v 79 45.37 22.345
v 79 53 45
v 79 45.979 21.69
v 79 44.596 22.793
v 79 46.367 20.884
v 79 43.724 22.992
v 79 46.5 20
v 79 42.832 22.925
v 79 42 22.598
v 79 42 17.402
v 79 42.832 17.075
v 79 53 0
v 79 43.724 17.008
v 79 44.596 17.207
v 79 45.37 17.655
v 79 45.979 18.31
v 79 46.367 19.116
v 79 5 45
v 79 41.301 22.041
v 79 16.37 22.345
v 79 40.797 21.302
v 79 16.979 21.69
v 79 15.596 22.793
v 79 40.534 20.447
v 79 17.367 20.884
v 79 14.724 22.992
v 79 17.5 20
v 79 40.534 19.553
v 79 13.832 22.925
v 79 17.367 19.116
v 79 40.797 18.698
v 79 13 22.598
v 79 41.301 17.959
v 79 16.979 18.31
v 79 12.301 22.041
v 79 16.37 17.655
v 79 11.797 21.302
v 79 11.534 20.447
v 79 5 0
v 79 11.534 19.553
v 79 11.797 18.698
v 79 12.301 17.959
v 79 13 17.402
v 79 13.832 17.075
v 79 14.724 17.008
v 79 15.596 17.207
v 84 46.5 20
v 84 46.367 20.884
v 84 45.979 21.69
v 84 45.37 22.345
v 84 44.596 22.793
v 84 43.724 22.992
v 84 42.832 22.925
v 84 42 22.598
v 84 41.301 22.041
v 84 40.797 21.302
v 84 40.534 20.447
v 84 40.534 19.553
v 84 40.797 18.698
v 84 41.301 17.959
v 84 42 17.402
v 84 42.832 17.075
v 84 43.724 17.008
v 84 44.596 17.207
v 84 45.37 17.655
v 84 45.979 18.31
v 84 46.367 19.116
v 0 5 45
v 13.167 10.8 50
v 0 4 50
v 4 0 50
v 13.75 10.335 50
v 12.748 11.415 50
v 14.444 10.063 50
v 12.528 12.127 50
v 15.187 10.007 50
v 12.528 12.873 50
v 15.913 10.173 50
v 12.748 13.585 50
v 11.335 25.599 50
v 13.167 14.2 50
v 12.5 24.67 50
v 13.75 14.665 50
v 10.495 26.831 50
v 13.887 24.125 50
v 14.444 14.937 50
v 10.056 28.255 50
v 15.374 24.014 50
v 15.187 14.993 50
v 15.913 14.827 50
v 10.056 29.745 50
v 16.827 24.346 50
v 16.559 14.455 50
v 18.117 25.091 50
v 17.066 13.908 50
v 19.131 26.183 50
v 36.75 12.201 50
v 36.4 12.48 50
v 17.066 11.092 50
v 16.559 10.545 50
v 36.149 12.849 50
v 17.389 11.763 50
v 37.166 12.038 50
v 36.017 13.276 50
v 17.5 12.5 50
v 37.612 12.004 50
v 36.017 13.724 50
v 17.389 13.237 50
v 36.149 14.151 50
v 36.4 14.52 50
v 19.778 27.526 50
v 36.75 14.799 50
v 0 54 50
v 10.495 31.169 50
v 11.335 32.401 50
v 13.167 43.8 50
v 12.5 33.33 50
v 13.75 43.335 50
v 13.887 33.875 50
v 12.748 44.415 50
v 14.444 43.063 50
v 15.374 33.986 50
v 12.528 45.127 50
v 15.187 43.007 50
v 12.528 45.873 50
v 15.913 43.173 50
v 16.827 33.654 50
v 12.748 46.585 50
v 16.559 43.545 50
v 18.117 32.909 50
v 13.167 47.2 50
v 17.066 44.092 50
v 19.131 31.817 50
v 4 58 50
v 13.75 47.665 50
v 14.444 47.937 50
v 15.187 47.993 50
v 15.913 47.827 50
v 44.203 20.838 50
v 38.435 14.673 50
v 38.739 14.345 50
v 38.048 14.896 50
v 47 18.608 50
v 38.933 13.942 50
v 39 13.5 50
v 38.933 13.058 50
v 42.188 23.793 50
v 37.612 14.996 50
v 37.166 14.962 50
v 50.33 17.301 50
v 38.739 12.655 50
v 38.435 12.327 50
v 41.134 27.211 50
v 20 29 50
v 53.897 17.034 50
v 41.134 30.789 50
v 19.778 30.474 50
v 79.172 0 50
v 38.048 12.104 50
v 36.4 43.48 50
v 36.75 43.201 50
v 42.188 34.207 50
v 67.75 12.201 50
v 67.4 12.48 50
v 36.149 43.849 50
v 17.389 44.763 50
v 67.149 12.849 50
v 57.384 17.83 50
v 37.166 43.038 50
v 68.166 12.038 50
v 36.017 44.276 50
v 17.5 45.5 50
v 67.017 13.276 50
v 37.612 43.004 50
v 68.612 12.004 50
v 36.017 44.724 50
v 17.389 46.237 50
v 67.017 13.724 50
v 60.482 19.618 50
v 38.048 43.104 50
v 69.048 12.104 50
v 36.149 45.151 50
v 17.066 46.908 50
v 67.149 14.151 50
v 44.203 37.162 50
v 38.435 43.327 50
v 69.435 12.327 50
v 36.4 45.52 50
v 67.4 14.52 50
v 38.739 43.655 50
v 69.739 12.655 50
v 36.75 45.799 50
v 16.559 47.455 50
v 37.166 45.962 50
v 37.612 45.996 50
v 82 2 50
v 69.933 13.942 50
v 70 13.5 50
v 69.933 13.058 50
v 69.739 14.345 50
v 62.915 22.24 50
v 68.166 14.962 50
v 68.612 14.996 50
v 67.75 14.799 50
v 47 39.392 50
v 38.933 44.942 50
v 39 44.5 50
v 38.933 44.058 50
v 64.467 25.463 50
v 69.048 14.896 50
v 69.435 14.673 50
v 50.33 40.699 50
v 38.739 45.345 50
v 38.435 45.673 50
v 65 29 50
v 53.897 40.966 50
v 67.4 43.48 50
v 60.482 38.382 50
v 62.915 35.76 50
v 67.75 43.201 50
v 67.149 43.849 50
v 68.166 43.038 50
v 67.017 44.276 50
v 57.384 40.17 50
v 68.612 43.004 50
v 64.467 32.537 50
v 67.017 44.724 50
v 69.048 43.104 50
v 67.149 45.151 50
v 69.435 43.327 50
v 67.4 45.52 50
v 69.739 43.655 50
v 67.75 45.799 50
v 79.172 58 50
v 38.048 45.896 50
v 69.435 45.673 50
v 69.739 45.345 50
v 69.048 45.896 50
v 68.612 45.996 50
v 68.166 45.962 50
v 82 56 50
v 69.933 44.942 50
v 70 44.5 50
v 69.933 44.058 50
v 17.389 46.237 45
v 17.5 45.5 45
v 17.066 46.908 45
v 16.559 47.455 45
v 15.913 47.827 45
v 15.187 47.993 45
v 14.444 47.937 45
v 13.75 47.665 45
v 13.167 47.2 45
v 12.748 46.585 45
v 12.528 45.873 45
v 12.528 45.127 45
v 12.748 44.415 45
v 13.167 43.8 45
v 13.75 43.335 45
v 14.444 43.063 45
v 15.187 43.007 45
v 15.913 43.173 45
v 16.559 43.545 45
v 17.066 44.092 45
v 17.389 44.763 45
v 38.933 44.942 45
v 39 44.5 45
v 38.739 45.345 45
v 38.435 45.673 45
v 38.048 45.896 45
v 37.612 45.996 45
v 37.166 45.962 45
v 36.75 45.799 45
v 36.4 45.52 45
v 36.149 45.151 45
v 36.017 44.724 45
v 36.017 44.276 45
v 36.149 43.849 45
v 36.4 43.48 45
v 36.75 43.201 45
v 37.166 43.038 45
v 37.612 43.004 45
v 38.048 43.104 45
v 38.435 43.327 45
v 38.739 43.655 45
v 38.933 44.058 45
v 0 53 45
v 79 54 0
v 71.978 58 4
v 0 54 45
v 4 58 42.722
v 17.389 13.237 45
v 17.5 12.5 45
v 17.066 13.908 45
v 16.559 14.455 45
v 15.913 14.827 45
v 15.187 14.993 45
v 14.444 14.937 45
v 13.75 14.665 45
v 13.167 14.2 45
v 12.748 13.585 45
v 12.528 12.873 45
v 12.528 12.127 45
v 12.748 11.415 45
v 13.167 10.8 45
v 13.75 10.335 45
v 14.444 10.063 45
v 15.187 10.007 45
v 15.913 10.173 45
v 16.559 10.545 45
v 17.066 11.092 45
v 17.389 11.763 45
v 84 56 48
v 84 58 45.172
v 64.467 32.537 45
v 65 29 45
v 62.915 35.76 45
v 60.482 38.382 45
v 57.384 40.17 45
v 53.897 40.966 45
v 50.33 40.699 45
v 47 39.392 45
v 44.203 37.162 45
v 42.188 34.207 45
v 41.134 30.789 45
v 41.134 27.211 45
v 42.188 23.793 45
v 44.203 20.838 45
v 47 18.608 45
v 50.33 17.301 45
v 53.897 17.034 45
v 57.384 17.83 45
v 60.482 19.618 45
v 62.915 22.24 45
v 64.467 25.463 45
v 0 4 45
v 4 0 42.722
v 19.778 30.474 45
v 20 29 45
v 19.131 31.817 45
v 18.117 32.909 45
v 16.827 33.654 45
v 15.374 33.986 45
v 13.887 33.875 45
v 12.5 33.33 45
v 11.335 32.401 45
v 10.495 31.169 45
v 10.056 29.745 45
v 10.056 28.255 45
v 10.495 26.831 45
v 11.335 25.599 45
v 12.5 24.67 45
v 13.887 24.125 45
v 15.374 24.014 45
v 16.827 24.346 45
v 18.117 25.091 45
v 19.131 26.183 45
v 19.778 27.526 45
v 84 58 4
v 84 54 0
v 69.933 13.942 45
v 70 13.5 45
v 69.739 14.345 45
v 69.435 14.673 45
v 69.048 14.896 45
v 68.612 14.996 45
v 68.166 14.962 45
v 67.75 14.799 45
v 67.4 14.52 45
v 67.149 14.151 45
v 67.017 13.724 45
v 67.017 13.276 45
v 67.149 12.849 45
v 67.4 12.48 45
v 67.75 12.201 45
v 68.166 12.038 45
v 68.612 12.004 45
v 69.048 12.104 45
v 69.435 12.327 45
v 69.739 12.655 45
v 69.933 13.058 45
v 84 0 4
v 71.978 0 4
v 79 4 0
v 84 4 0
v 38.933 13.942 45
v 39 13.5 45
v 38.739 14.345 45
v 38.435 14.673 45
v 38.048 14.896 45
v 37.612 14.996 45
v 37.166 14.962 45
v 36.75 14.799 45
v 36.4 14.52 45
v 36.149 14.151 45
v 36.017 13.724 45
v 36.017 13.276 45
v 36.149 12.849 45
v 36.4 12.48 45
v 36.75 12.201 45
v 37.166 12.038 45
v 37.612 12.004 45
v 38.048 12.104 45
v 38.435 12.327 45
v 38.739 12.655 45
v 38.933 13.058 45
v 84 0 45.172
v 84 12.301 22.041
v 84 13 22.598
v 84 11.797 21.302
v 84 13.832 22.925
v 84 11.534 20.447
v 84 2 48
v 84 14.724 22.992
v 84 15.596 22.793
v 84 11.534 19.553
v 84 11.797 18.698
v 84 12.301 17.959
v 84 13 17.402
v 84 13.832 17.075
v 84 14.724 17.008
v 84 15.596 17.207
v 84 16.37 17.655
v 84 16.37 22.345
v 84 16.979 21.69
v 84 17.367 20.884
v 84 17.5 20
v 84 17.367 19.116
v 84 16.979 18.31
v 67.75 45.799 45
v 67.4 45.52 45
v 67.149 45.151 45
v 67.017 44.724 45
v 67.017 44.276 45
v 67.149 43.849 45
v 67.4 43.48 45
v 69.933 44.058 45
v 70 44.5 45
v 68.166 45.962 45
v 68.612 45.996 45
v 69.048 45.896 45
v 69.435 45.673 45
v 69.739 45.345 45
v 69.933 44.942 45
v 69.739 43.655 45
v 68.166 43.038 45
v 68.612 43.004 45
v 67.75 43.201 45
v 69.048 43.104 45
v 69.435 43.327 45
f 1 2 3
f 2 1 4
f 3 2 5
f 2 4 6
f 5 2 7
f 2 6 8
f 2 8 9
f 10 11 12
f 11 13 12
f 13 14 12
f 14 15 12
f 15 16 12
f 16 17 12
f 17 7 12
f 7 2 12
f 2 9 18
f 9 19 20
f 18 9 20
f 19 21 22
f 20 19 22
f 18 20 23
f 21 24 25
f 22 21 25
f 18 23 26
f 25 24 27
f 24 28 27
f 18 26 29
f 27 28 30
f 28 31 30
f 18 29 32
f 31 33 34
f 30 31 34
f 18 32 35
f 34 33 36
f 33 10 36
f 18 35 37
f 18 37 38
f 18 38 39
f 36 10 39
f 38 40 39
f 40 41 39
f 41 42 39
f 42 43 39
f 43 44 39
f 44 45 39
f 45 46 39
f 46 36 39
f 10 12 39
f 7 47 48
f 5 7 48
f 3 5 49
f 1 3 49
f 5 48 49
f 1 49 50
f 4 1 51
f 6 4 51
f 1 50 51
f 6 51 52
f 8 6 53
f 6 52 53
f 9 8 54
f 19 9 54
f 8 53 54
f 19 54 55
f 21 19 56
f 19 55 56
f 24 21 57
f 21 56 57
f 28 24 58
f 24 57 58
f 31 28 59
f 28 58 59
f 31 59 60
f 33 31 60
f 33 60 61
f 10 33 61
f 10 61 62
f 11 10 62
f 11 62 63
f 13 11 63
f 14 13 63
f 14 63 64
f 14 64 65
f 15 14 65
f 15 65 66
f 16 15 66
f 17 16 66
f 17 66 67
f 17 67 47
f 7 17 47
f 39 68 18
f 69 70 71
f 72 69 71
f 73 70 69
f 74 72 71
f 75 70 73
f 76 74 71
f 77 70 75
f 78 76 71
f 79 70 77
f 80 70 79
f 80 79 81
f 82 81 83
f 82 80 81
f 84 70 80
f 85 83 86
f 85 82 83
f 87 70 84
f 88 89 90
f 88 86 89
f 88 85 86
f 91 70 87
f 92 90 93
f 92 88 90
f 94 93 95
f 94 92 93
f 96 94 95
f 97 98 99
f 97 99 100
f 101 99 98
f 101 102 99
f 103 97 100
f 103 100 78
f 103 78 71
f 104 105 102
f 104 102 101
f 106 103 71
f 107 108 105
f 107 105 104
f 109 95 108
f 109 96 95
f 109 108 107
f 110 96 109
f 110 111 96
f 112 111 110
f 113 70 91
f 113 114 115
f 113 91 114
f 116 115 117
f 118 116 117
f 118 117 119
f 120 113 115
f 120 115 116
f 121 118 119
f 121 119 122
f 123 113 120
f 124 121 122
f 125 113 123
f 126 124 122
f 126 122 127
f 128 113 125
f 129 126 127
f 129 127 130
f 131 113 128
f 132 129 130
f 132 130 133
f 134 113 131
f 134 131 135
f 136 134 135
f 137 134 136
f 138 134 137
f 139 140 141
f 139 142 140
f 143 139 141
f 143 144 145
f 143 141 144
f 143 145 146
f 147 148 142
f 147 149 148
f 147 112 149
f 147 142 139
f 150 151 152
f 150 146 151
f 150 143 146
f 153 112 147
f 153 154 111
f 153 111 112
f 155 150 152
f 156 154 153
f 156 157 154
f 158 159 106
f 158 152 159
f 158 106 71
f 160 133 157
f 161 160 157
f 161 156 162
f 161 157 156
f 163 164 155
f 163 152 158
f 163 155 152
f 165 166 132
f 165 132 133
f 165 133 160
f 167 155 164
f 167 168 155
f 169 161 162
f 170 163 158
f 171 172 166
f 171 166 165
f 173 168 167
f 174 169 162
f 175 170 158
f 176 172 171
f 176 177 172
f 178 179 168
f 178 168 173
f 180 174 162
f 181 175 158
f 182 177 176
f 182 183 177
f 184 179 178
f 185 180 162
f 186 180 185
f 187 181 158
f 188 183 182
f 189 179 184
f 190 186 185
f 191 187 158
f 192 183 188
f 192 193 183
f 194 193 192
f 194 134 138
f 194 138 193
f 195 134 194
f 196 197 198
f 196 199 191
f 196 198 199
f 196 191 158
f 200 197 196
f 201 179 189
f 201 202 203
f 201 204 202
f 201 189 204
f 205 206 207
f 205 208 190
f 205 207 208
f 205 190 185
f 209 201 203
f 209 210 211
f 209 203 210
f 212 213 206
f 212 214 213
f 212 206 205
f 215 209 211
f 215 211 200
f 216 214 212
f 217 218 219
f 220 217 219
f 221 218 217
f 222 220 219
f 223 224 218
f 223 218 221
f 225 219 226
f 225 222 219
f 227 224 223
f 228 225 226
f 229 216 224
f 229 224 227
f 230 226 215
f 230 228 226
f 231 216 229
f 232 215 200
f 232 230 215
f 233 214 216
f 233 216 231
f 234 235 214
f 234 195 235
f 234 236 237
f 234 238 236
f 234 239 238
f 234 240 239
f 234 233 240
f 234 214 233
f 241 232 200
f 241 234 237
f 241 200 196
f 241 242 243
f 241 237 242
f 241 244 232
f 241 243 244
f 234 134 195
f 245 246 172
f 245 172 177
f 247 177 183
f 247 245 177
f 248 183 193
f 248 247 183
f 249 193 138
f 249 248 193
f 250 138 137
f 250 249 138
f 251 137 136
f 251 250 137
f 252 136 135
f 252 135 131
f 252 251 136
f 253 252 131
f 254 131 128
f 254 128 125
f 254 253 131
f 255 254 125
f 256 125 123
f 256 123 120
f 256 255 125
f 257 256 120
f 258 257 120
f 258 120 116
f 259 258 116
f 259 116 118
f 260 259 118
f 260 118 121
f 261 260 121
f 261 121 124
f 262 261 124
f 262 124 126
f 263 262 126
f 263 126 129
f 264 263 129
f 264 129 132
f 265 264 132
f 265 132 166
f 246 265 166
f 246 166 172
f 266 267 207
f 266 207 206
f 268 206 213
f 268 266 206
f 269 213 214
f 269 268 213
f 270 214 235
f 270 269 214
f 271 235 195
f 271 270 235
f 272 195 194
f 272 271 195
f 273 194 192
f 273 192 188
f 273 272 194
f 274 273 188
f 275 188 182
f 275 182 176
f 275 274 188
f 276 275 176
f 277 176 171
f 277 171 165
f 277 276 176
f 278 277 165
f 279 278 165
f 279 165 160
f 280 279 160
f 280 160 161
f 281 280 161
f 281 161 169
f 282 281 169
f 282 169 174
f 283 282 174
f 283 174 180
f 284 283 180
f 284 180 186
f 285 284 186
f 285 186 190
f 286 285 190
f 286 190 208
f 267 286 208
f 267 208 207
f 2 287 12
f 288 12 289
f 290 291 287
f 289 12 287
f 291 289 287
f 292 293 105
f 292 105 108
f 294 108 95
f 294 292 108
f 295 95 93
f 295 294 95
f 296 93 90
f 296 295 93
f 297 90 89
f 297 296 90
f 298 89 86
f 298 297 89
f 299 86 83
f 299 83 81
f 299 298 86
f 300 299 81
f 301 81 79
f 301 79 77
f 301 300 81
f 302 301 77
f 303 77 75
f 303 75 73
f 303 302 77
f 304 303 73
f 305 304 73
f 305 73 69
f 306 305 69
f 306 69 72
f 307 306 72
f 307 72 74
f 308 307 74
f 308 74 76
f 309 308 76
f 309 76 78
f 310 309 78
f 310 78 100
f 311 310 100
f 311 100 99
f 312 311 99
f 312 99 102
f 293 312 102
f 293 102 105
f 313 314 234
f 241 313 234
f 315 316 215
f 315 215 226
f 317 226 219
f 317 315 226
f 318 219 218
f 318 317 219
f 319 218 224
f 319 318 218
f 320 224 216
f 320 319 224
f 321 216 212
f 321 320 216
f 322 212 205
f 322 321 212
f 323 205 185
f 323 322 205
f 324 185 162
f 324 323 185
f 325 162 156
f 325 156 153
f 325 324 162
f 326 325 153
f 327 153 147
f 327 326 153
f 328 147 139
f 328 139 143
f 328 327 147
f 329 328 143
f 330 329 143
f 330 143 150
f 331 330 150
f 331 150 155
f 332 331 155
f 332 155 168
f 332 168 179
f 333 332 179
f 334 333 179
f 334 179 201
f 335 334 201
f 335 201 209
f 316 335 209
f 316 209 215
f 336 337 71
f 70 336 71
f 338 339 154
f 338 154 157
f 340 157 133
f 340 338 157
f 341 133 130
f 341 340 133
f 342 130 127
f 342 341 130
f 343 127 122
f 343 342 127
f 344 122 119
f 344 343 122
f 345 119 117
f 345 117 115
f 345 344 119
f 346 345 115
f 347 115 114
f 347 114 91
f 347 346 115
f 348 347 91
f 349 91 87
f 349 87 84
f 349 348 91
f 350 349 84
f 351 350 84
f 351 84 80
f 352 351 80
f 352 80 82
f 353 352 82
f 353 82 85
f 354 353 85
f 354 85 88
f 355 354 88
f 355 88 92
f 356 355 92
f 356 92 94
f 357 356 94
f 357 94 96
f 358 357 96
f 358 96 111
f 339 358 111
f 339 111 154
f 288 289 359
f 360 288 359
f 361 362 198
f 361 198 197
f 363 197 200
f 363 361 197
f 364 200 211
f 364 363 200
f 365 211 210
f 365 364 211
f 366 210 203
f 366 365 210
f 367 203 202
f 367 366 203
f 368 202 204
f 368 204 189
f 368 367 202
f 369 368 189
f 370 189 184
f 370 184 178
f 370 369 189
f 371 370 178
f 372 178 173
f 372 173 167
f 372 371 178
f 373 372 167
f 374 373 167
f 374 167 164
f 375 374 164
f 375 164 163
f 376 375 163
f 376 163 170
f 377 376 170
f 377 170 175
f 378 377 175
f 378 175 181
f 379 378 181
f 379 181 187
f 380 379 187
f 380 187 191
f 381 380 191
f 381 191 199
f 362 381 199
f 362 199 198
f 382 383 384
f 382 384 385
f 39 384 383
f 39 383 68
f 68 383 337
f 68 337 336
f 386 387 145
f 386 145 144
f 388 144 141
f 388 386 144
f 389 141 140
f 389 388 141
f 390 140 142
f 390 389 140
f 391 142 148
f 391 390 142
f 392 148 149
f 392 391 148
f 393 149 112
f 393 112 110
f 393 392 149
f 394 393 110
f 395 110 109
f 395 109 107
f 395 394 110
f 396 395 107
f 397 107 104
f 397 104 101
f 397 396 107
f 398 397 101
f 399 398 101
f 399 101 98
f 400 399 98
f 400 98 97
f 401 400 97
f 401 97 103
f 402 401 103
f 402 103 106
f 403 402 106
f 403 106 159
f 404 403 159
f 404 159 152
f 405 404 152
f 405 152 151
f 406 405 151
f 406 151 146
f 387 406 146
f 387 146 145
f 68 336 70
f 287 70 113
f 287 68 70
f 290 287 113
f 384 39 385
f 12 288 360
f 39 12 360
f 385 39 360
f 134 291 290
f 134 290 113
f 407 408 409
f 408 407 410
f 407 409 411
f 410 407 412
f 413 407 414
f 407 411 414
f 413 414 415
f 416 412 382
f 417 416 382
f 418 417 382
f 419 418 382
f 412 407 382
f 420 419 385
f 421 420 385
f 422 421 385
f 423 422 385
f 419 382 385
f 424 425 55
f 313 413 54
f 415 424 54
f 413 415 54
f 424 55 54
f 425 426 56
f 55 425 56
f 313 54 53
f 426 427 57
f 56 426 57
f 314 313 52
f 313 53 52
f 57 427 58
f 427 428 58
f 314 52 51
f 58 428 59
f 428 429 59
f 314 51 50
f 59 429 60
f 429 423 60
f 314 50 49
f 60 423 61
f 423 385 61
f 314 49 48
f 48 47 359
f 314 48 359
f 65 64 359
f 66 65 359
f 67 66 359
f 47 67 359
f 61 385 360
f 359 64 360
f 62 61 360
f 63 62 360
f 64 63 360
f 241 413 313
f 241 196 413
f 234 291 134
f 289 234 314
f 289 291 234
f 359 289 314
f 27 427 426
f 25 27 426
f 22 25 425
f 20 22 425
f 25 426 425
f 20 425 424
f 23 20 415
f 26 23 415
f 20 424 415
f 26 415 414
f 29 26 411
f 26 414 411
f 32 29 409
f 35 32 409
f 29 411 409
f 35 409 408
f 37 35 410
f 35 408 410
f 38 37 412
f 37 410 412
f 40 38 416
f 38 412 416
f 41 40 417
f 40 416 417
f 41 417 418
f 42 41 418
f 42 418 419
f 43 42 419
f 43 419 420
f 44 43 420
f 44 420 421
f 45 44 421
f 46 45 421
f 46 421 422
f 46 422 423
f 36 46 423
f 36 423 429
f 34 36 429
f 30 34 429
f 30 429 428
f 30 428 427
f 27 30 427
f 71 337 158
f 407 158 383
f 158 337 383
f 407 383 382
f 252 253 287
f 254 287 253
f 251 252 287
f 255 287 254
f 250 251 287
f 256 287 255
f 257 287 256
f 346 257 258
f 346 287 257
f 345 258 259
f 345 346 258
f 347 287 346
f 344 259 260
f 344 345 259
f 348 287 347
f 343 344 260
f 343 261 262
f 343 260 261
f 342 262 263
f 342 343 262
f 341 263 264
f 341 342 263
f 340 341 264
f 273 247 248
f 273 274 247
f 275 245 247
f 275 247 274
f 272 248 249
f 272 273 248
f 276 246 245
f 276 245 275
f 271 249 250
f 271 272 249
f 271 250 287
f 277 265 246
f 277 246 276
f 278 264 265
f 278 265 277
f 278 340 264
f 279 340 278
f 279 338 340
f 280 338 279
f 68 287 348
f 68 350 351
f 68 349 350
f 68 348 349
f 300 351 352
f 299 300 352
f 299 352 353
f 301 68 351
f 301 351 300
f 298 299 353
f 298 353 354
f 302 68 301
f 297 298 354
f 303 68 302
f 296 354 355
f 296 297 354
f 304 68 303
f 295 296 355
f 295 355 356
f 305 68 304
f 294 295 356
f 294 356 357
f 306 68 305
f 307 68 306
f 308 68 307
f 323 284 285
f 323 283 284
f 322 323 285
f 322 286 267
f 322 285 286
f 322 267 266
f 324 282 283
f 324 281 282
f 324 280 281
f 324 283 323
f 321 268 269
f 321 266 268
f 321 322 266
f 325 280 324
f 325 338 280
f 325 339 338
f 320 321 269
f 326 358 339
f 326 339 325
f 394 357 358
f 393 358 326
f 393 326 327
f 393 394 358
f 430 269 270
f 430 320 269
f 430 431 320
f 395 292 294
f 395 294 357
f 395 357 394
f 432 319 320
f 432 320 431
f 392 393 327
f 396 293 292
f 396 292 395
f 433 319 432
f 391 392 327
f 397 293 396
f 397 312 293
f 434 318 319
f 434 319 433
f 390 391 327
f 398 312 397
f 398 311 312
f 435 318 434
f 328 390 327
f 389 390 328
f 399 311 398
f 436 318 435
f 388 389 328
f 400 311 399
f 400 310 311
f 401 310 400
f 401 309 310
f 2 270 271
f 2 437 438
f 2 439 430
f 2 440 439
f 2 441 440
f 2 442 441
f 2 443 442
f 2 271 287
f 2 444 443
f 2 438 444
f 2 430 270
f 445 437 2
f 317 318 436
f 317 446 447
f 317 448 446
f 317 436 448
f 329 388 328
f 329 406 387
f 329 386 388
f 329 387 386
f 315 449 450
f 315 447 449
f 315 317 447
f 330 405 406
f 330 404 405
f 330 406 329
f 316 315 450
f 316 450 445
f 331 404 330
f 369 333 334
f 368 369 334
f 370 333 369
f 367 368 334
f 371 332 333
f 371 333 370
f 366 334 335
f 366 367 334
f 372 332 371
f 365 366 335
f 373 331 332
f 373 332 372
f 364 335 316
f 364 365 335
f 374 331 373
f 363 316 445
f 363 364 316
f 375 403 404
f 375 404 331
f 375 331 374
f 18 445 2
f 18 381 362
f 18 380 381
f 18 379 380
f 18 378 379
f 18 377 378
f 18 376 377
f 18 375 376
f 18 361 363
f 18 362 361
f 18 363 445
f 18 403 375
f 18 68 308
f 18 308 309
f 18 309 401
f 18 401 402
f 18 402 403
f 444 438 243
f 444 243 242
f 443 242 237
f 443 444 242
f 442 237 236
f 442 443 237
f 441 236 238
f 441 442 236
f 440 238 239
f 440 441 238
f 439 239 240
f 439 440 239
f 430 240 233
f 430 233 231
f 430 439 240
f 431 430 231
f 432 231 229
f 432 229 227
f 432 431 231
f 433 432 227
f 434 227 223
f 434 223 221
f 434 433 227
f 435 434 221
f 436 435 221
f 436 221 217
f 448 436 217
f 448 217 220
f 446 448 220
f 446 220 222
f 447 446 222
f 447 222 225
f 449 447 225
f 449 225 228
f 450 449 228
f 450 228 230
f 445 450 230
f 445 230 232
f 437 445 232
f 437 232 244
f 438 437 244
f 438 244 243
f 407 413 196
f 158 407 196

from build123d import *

# Parameters (mm, degrees)
SKETCH_W        = 84
SKETCH_H        = 58
SKETCH_R        = 1.5
SKETCH_R_2      = 12
SKETCH_R_3      = 2.5
SKETCH_R_4      = 5
PAD_DEPTH       = 50
SKETCH001_W     = 79
SKETCH001_H     = 48
POCKET_DEPTH    = 45
POCKET001_DEPTH = 58.001
SKETCH003_R     = 3
POCKET002_DEPTH = 84.001
CHAMFER_SIZE    = 4
CHAMFER001_SIZE = 4
CHAMFER002_SIZE = 2
CHAMFER003_SIZE = 2


with BuildPart() as part:
    # Sketch → Pad (new body)
    with BuildSketch(Plane.XY):
        with Locations((42, 29)):
            Rectangle(SKETCH_W, SKETCH_H)
        with Locations((37.5, 44.5)):
            Circle(SKETCH_R, mode=Mode.SUBTRACT)
        with Locations((68.5, 44.5)):
            Circle(SKETCH_R, mode=Mode.SUBTRACT)
        with Locations((68.5, 13.5)):
            Circle(SKETCH_R, mode=Mode.SUBTRACT)
        with Locations((37.5, 13.5)):
            Circle(SKETCH_R, mode=Mode.SUBTRACT)
        with Locations((53, 29)):
            Circle(SKETCH_R_2, mode=Mode.SUBTRACT)
        with Locations((15, 45.5)):
            Circle(SKETCH_R_3, mode=Mode.SUBTRACT)
        with Locations((15, 12.5)):
            Circle(SKETCH_R_3, mode=Mode.SUBTRACT)
        with Locations((15, 29)):
            Circle(SKETCH_R_4, mode=Mode.SUBTRACT)
    extrude(amount=PAD_DEPTH)

    # Sketch001 (on Face13 of Pad) → Pocket (cut)
    with BuildSketch(Plane(origin=(0, 0, 0), x_dir=(1, 0, 0), z_dir=(0, 0, -1))):
        with Locations((39.5, -29)):
            Rectangle(SKETCH001_W, SKETCH001_H)
    extrude(amount=-POCKET_DEPTH, mode=Mode.SUBTRACT)

    # Sketch002 (on Face9 of Pocket) → Pocket001 (cut, through all)
    with BuildSketch(Plane.XZ):
        Polygon((0, 45), (0, 0), (79, 0), align=None)
    extrude(amount=-POCKET001_DEPTH, mode=Mode.SUBTRACT)

    # Sketch003 (on Face4 of Pocket001) → Pocket002 (cut, through all)
    with BuildSketch(Plane.YZ.offset(84)):
        with Locations((14.5, 20)):
            Circle(SKETCH003_R)
        with Locations((43.5, 20)):
            Circle(SKETCH003_R)
    extrude(amount=-POCKET002_DEPTH, mode=Mode.SUBTRACT)

    # Chamfer
    chamfer_edges = [part.edges().sort_by_distance(p)[0] for p in [
        (0, 58, 47.5),
        (0, 0, 47.5),
    ]]
    chamfer(chamfer_edges, length=CHAMFER_SIZE)

    # Chamfer001
    chamfer001_edges = [part.edges().sort_by_distance(p)[0] for p in [
        (81.5, 0, 0),
        (81.5, 58, 0),
    ]]
    chamfer(chamfer001_edges, length=CHAMFER001_SIZE)

    # Chamfer002
    chamfer002_edges = [part.edges().sort_by_distance(p)[0] for p in [
        (84, 29, 50),
    ]]
    chamfer(chamfer002_edges, length=CHAMFER002_SIZE)

    # Chamfer003
    chamfer003_edges = [part.edges().sort_by_distance(p)[0] for p in [
        (83, 0, 49),
        (83, 58, 49),
    ]]
    chamfer(chamfer003_edges, length=CHAMFER003_SIZE)


solid = part.part
